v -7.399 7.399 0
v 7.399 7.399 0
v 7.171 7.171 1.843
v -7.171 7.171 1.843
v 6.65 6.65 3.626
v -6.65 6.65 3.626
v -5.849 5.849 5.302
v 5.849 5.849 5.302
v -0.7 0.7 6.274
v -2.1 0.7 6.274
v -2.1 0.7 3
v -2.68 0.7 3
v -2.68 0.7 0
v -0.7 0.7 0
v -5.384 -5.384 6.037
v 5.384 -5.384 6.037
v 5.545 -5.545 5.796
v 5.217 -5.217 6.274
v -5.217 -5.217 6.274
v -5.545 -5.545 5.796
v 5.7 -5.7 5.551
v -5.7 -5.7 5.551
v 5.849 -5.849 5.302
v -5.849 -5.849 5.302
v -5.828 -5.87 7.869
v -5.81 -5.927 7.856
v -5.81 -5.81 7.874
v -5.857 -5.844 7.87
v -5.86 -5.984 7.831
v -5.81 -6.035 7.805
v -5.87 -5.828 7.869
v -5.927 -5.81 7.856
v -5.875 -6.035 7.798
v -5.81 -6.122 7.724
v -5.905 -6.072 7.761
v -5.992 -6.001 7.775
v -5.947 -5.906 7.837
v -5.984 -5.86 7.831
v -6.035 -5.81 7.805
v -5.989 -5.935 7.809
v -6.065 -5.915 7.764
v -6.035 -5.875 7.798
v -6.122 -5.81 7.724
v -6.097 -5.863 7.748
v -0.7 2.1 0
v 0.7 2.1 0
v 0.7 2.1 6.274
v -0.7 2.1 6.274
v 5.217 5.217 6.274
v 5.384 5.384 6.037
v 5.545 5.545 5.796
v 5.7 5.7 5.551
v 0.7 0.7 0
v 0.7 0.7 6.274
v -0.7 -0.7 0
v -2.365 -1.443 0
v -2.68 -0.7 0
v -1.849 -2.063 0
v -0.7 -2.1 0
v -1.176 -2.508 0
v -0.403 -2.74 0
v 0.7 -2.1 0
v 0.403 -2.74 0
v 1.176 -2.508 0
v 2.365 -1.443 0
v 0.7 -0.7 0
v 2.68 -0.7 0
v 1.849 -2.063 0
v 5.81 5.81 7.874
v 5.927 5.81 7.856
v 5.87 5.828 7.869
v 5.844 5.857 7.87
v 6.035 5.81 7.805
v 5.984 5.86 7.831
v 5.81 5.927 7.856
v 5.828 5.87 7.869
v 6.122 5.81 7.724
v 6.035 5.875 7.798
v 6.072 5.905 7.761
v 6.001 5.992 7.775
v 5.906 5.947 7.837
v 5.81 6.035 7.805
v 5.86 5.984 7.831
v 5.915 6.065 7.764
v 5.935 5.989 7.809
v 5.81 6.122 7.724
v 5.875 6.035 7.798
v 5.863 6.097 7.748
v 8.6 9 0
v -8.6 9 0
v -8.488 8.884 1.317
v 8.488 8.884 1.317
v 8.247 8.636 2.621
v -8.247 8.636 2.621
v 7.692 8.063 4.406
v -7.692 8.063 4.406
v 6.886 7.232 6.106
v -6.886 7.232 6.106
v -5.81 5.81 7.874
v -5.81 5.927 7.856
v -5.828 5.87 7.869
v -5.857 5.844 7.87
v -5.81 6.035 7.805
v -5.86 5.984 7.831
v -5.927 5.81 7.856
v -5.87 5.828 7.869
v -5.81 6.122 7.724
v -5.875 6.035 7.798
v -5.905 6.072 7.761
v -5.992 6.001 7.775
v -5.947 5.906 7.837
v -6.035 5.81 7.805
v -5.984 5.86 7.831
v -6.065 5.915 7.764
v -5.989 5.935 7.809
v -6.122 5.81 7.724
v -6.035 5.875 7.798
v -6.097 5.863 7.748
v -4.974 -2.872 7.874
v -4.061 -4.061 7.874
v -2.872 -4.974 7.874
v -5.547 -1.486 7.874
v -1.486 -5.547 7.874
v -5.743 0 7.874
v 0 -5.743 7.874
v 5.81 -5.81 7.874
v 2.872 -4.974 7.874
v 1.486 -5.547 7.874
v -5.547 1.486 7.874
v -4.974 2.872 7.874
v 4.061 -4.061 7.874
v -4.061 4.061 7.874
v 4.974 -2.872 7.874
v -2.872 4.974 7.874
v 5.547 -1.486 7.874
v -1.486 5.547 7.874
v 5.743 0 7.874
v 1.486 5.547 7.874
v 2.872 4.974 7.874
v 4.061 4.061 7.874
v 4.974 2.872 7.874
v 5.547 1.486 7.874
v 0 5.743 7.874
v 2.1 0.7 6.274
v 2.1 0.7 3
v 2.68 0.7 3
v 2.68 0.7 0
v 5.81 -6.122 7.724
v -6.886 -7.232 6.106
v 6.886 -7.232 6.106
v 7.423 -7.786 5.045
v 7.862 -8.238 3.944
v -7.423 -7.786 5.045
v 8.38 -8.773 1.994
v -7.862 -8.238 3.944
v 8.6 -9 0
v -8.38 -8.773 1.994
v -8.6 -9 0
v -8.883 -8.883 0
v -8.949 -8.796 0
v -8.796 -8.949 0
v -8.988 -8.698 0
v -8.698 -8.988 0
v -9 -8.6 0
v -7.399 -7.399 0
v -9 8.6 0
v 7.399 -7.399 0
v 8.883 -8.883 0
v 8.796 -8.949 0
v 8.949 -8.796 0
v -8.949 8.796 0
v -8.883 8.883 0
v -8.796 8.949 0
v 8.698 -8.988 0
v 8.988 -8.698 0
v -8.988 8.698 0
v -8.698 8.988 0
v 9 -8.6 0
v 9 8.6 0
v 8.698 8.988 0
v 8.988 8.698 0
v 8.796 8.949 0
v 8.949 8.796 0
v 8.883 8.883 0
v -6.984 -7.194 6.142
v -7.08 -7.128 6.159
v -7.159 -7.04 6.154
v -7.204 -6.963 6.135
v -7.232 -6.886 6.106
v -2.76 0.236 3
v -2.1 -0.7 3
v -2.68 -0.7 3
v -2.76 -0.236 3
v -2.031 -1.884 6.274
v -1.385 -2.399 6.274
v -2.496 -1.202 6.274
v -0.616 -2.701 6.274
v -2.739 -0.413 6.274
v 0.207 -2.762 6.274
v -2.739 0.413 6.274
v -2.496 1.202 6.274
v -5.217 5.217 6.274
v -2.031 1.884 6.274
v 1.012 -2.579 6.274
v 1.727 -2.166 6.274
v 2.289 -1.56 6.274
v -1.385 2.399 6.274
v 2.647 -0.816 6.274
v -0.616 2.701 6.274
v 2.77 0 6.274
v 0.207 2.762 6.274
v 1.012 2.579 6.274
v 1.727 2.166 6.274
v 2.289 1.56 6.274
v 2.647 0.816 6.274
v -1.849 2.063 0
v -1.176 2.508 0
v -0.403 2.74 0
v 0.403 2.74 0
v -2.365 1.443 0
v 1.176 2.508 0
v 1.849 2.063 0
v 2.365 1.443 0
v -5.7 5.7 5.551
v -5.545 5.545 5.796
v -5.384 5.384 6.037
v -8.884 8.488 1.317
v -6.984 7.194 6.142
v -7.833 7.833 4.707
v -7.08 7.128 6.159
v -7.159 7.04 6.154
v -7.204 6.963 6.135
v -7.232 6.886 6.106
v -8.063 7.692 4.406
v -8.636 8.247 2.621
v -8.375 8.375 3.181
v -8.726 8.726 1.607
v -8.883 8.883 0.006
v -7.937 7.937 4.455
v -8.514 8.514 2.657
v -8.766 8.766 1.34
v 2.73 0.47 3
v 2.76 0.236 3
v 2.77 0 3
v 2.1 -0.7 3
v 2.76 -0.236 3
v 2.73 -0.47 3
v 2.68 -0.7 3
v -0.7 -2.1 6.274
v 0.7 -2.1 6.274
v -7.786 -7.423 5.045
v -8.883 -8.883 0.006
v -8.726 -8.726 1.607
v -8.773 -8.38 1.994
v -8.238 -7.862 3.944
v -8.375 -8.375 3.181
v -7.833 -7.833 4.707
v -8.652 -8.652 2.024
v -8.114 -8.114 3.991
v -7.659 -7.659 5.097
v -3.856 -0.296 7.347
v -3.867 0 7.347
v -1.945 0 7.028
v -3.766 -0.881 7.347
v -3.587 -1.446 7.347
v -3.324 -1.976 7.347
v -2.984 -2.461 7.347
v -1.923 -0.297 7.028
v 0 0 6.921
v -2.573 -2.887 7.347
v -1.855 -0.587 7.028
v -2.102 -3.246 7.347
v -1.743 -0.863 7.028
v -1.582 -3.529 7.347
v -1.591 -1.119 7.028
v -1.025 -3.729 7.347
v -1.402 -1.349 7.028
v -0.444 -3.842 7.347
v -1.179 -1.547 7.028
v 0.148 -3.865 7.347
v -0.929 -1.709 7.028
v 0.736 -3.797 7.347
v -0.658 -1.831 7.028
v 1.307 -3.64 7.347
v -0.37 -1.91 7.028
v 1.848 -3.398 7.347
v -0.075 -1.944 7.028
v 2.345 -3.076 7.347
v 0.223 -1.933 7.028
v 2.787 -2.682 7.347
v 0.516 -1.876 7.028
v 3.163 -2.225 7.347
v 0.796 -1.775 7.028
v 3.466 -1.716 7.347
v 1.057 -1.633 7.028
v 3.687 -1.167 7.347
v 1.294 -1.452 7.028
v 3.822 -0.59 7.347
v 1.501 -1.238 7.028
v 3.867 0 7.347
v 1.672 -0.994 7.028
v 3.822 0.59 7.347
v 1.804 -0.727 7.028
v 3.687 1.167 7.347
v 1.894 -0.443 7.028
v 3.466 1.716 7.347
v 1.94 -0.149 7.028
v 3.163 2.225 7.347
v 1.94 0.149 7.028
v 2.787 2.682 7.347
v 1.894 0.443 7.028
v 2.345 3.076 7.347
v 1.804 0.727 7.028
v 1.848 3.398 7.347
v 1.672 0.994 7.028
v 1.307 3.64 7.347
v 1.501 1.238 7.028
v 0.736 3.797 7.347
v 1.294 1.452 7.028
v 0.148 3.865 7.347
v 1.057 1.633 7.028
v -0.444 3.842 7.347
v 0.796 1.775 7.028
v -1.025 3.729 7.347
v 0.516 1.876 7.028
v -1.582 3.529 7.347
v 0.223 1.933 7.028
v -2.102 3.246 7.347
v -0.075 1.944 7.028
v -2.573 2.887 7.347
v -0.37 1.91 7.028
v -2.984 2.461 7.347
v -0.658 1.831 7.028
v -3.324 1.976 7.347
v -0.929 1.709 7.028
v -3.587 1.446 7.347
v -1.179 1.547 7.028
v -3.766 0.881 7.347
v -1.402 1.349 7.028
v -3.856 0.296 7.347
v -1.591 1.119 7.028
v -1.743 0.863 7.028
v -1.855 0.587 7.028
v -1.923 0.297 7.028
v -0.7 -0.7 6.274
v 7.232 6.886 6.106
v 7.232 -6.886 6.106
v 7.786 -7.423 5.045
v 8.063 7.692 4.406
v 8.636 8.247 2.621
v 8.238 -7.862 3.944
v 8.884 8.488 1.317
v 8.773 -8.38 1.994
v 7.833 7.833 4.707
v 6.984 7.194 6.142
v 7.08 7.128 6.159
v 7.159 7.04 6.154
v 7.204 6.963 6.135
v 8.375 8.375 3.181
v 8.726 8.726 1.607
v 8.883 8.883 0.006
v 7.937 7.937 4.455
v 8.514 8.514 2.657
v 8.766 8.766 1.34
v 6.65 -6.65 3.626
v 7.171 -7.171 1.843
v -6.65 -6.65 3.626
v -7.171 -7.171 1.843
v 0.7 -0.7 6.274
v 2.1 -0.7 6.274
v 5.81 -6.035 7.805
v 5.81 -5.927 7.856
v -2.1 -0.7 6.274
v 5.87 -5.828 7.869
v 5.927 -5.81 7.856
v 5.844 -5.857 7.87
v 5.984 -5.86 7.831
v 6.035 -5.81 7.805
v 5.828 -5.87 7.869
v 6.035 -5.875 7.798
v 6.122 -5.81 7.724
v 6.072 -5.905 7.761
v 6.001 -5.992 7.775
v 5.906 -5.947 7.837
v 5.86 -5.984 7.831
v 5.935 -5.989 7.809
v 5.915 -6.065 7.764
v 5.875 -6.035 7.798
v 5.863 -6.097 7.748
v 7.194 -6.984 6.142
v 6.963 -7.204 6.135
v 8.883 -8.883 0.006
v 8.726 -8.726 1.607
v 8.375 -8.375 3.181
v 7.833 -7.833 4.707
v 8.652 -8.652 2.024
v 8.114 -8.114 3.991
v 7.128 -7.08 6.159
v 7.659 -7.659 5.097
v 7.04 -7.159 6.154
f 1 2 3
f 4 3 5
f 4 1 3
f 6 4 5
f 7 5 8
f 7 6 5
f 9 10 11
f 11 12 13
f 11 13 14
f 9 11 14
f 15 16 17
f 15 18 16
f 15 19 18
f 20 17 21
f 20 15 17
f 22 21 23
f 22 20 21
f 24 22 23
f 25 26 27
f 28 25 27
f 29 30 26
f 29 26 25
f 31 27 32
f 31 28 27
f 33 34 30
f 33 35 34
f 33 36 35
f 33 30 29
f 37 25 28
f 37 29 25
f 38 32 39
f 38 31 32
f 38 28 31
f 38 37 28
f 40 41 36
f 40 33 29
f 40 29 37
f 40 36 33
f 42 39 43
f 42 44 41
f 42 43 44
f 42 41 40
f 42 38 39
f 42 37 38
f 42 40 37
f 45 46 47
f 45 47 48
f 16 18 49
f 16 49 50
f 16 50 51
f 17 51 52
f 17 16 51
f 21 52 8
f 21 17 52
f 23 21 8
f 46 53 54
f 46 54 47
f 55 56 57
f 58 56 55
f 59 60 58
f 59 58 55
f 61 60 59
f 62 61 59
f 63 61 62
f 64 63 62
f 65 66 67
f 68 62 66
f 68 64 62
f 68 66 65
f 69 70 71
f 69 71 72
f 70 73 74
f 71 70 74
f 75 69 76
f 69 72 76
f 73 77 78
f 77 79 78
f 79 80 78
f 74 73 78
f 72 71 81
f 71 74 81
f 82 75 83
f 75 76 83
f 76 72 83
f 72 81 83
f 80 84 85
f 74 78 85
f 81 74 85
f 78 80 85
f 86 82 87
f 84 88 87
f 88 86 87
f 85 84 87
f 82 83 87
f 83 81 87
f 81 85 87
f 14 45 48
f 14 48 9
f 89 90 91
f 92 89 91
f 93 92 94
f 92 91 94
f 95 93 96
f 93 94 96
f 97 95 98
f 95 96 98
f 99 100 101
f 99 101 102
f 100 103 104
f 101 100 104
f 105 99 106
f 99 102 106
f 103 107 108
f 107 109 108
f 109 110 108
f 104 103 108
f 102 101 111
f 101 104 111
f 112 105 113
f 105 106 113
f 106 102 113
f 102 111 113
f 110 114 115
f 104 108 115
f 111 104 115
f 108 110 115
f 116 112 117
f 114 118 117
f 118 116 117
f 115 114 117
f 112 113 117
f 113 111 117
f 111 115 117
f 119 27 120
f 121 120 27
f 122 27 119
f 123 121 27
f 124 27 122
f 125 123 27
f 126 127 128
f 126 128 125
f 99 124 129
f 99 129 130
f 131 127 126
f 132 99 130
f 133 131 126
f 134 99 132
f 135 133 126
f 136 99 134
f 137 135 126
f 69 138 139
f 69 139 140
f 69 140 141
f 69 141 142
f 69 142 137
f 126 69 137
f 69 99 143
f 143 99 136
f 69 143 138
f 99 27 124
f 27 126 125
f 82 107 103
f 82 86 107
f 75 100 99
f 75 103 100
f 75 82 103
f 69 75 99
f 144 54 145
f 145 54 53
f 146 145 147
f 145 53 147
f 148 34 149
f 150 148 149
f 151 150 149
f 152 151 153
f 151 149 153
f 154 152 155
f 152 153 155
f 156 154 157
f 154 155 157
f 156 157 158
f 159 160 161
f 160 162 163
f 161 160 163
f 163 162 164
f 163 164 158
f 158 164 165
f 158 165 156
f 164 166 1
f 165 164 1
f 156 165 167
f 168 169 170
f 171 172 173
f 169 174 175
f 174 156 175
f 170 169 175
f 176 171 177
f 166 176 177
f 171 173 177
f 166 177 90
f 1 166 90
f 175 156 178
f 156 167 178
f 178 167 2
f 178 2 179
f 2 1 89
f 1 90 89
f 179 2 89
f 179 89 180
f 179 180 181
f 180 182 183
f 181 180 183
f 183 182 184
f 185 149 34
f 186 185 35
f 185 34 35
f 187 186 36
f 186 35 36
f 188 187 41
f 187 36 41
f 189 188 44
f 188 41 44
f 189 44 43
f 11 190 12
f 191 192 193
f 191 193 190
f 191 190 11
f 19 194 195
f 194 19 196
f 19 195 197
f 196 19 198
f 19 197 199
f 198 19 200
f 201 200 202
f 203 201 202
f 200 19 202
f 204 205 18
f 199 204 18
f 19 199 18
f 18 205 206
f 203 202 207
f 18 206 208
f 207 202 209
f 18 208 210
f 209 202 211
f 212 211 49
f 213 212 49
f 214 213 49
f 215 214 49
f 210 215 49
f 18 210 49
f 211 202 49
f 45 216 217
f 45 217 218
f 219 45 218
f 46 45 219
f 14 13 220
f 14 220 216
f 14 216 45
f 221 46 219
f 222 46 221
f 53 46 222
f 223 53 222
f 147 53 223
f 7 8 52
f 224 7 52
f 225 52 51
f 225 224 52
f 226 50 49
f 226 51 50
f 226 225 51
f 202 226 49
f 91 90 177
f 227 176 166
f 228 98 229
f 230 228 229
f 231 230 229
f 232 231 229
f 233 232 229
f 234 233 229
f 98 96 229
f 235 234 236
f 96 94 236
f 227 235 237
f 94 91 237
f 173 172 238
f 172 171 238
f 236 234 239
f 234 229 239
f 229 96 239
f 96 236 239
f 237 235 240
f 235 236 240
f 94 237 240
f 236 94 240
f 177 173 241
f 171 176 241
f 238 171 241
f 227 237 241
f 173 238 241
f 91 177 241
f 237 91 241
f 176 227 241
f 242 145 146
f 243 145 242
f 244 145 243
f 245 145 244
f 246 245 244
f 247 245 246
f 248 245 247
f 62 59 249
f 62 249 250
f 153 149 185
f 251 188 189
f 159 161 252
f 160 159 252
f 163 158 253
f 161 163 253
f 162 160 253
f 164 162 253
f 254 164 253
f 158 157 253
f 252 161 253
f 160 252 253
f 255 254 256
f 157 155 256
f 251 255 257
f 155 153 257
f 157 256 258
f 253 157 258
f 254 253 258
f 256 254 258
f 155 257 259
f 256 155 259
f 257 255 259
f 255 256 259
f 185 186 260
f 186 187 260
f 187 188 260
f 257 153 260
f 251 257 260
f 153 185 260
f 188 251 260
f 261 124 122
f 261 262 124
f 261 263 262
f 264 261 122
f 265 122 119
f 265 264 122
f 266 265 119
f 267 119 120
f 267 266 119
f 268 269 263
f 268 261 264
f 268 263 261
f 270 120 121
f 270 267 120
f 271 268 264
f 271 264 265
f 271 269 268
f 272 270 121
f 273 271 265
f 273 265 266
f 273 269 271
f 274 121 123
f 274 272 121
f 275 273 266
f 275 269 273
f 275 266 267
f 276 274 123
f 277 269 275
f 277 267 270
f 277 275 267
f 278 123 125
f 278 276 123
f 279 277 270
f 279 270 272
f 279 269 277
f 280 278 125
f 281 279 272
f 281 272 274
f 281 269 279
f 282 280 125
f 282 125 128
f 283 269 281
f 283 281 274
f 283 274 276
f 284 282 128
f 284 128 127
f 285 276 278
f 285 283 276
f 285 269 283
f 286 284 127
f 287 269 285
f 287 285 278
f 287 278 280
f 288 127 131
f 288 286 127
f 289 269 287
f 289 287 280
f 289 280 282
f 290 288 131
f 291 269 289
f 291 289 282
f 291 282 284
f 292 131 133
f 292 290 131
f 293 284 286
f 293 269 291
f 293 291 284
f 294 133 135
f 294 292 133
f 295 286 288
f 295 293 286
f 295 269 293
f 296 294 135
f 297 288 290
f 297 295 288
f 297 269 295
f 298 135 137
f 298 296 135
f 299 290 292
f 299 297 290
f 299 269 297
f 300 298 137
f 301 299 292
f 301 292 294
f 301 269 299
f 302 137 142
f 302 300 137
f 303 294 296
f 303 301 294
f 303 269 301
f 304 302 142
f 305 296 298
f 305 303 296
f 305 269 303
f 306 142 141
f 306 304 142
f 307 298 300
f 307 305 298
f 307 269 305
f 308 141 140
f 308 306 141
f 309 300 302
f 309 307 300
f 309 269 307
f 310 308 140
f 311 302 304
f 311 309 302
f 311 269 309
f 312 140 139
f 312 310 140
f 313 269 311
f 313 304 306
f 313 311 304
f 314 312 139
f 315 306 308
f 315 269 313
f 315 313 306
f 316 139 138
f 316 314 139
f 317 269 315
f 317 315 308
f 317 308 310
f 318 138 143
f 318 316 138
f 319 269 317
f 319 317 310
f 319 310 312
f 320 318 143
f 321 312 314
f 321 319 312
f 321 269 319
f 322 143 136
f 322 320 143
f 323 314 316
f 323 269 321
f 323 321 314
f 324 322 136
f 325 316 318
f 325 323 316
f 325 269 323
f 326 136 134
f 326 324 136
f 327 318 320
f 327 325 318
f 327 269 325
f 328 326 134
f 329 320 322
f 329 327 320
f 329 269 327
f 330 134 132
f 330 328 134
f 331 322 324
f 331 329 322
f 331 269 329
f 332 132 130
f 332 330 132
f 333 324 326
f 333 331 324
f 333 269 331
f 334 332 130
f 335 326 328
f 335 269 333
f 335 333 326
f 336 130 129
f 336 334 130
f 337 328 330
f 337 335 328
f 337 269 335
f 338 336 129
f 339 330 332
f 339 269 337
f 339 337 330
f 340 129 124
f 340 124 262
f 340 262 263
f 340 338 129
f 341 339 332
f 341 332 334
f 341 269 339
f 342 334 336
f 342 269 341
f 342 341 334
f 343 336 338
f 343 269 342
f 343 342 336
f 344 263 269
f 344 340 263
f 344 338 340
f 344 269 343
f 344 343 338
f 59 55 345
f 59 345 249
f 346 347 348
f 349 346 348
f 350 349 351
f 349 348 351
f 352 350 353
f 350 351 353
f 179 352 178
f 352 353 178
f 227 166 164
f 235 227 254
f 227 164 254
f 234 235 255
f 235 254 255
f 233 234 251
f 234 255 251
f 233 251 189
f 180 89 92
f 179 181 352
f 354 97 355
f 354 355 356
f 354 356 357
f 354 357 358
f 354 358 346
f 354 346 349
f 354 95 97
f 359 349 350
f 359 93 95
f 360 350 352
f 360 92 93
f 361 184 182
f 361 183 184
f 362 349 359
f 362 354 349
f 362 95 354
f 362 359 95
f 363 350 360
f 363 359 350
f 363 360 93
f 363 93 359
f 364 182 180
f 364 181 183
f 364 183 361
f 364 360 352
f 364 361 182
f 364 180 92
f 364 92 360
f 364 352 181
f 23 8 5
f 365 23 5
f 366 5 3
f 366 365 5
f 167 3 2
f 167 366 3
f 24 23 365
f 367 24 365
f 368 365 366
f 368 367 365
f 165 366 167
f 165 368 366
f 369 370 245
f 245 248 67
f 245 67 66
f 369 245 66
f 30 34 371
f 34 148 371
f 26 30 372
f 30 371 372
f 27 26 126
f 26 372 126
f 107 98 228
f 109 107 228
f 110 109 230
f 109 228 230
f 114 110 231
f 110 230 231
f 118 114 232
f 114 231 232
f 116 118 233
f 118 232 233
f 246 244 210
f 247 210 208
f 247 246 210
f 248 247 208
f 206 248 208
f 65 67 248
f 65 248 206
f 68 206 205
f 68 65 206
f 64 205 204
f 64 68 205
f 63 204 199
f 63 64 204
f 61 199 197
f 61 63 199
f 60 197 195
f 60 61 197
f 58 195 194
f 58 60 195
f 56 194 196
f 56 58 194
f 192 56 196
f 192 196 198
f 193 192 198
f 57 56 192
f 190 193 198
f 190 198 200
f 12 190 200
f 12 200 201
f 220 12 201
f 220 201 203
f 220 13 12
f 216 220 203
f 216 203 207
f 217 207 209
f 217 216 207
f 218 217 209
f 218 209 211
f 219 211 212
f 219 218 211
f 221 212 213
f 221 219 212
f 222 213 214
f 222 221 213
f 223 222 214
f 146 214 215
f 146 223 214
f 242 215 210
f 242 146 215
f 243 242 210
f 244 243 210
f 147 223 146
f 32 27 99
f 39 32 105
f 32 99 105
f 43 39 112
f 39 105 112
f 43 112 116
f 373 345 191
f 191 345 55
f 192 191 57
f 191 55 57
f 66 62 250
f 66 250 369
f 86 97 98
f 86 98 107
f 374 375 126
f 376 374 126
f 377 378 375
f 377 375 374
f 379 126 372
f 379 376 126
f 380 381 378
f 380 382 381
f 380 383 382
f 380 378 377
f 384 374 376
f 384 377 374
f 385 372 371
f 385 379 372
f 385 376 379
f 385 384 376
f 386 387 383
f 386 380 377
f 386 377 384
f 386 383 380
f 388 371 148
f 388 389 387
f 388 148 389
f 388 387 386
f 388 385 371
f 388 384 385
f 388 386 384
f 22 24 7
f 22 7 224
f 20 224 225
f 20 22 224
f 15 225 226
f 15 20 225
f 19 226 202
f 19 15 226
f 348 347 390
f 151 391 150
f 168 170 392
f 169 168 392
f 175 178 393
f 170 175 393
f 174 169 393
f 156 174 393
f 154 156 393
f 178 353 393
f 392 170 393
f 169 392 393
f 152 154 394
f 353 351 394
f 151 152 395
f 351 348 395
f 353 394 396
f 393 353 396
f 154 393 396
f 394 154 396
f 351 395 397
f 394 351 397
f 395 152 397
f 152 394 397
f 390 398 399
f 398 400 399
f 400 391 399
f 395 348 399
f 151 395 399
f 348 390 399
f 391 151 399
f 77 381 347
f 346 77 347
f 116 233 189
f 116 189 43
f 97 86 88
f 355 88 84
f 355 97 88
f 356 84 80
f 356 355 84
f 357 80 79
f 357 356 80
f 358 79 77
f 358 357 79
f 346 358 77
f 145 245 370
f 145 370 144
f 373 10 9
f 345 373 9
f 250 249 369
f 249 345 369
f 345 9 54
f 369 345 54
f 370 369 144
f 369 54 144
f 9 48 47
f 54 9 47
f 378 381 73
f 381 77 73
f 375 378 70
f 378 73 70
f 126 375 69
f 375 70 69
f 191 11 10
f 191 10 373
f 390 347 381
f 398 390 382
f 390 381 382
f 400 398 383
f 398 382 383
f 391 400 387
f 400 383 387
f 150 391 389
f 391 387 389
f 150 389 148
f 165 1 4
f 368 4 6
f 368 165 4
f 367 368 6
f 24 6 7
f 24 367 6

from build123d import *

# Parameters (mm, degrees)
F0_W      = 18
F0_H      = 18
F1_DEPTH  = 7.874
F4_DEPTH  = 25
F5_DEPTH  = 25
F6_T      = -1.6
F7_R      = 2.77
F8_DEPTH  = 7
F10_DEPTH = 3
F11_R     = 0.4


with BuildPart() as f1:
    # F0 (on Top) → F1 (new body)
    with BuildSketch(Plane.XY):
        Rectangle(F0_W, F0_H)
    extrude(amount=F1_DEPTH)

    # F3 (on face) → F4 (cut)
    with BuildSketch(Plane(origin=(-9, 0, 0), x_dir=(0, -1, 0), z_dir=(-1, 0, 0))):
        with BuildLine():
            Line((-6, 7.874), (-9, 7.874))
            Line((-9, 7.874), (-7.232233047, 6.106233047))
            ThreePointArc((-7.232233047, 6.106233047), (-6.6524748606, 7.0154603305), (-6, 7.874))
        make_face()
        with BuildLine():
            Line((-7.232233047, 6.106233047), (-9, 7.874))
            Line((-9, 7.874), (-9, 0))
            ThreePointArc((-9, 0), (-8.491581374, 3.1618143655), (-7.232233047, 6.106233047))
        make_face()
        with BuildLine():
            Line((9, 7.874), (6, 7.874))
            ThreePointArc((6, 7.874), (6.6524748606, 7.0154603305), (7.232233047, 6.106233047))
            Line((7.232233047, 6.106233047), (9, 7.874))
        make_face()
        with BuildLine():
            ThreePointArc((7.232233047, 6.106233047), (8.491581374, 3.1618143655), (9, 0))
            Line((9, 0), (9, 7.874))
            Line((9, 7.874), (7.232233047, 6.106233047))
        make_face()
    extrude(amount=-F4_DEPTH, mode=Mode.SUBTRACT)

    # F2 (on face) → F5 (cut)
    with BuildSketch(Plane.XZ.offset(9)):
        with BuildLine():
            Line((-7.232233047, 6.106233047), (-9, 7.874))
            Line((-9, 7.874), (-9, 0))
            ThreePointArc((-9, 0), (-8.491581374, 3.1618143655), (-7.232233047, 6.106233047))
        make_face()
        with BuildLine():
            Line((-6, 7.874), (-9, 7.874))
            Line((-9, 7.874), (-7.232233047, 6.106233047))
            ThreePointArc((-7.232233047, 6.106233047), (-6.6524748606, 7.0154603305), (-6, 7.874))
        make_face()
        with BuildLine():
            Line((9, 7.874), (6, 7.874))
            ThreePointArc((6, 7.874), (6.6524748606, 7.0154603305), (7.232233047, 6.106233047))
            Line((7.232233047, 6.106233047), (9, 7.874))
        make_face()
        with BuildLine():
            ThreePointArc((7.232233047, 6.106233047), (8.491581374, 3.1618143655), (9, 0))
            Line((9, 0), (9, 7.874))
            Line((9, 7.874), (7.232233047, 6.106233047))
        make_face()
    extrude(amount=-F5_DEPTH, mode=Mode.SUBTRACT)

    # F6
    f6_openings = [f1.faces().sort_by_distance(p)[0] for p in [
        (0, 0, 0),
    ]]
    offset(amount=F6_T, openings=f6_openings)

    # F7 (on face) → F8 (join)
    with BuildSketch(Plane(origin=(0, 0, 0), x_dir=(1, 0, 0), z_dir=(0, 0, -1))):
        Circle(F7_R)
        Polygon((0.7, 2.1), (0.7, 0.7), (2.1, 0.7), (2.1, 0), (2.1, -0.7), (0.7, -0.7), (0.7, -2.1), (0, -2.1), (-0.7, -2.1), (-0.7, -0.7), (-2.1, -0.7), (-2.1, 0), (-2.1, 0.7), (-0.7, 0.7), (-0.7, 2.1), (0, 2.1), align=None, mode=Mode.SUBTRACT)
    extrude(amount=-F8_DEPTH)

    # F9 (on face) → F10 (cut)
    with BuildSketch(Plane(origin=(0, 0, 0), x_dir=(1, 0, 0), z_dir=(0, 0, -1))):
        with BuildLine():
            Line((-2.1, -0.7), (-2.1, 0.7))
            Line((-2.1, 0.7), (-2.680093282, 0.7))
            ThreePointArc((-2.680093282, 0.7), (-2.77, 0), (-2.680093282, -0.7))
            Line((-2.680093282, -0.7), (-2.1, -0.7))
        make_face()
        with BuildLine():
            ThreePointArc((2.77, 0), (2.7474313814, 0.3528750551), (2.680093282, 0.7))
            Line((2.680093282, 0.7), (2.1, 0.7))
            Line((2.1, 0.7), (2.1, -0.7))
            Line((2.1, -0.7), (2.680093282, -0.7))
            ThreePointArc((2.680093282, -0.7), (2.7474313814, -0.3528750551), (2.77, 0))
        make_face()
    extrude(amount=-F10_DEPTH, mode=Mode.SUBTRACT)

    # F11
    f11_edges = [f1.edges().sort_by_distance(p)[0] for p in [
        (6, 0, 7.874),
        (0, -6, 7.874),
        (0, 6, 7.874),
        (-6, 0, 7.874),
        (8.078099, 8.078099, 4.367421),
        (8.078099, -8.078099, 4.367421),
        (-8.078099, -8.078099, 4.367421),
        (-8.078099, 8.078099, 4.367421),
    ]]
    fillet(f11_edges, radius=F11_R)

    # F12 (on Front) → F13 (revolve, cut)
    with BuildSketch(Plane.XZ):
        with BuildLine():
            ThreePointArc((-10, 10), (-5.2316729526, 7.7080140656), (0, 6.9207780963))
            Line((0, 6.9207780963), (0, 10))
            Line((0, 10), (-10, 10))
        make_face()
    revolve(axis=Axis((0, 0, 5), (0, 0, 1)), mode=Mode.SUBTRACT)


solid = f1.part
